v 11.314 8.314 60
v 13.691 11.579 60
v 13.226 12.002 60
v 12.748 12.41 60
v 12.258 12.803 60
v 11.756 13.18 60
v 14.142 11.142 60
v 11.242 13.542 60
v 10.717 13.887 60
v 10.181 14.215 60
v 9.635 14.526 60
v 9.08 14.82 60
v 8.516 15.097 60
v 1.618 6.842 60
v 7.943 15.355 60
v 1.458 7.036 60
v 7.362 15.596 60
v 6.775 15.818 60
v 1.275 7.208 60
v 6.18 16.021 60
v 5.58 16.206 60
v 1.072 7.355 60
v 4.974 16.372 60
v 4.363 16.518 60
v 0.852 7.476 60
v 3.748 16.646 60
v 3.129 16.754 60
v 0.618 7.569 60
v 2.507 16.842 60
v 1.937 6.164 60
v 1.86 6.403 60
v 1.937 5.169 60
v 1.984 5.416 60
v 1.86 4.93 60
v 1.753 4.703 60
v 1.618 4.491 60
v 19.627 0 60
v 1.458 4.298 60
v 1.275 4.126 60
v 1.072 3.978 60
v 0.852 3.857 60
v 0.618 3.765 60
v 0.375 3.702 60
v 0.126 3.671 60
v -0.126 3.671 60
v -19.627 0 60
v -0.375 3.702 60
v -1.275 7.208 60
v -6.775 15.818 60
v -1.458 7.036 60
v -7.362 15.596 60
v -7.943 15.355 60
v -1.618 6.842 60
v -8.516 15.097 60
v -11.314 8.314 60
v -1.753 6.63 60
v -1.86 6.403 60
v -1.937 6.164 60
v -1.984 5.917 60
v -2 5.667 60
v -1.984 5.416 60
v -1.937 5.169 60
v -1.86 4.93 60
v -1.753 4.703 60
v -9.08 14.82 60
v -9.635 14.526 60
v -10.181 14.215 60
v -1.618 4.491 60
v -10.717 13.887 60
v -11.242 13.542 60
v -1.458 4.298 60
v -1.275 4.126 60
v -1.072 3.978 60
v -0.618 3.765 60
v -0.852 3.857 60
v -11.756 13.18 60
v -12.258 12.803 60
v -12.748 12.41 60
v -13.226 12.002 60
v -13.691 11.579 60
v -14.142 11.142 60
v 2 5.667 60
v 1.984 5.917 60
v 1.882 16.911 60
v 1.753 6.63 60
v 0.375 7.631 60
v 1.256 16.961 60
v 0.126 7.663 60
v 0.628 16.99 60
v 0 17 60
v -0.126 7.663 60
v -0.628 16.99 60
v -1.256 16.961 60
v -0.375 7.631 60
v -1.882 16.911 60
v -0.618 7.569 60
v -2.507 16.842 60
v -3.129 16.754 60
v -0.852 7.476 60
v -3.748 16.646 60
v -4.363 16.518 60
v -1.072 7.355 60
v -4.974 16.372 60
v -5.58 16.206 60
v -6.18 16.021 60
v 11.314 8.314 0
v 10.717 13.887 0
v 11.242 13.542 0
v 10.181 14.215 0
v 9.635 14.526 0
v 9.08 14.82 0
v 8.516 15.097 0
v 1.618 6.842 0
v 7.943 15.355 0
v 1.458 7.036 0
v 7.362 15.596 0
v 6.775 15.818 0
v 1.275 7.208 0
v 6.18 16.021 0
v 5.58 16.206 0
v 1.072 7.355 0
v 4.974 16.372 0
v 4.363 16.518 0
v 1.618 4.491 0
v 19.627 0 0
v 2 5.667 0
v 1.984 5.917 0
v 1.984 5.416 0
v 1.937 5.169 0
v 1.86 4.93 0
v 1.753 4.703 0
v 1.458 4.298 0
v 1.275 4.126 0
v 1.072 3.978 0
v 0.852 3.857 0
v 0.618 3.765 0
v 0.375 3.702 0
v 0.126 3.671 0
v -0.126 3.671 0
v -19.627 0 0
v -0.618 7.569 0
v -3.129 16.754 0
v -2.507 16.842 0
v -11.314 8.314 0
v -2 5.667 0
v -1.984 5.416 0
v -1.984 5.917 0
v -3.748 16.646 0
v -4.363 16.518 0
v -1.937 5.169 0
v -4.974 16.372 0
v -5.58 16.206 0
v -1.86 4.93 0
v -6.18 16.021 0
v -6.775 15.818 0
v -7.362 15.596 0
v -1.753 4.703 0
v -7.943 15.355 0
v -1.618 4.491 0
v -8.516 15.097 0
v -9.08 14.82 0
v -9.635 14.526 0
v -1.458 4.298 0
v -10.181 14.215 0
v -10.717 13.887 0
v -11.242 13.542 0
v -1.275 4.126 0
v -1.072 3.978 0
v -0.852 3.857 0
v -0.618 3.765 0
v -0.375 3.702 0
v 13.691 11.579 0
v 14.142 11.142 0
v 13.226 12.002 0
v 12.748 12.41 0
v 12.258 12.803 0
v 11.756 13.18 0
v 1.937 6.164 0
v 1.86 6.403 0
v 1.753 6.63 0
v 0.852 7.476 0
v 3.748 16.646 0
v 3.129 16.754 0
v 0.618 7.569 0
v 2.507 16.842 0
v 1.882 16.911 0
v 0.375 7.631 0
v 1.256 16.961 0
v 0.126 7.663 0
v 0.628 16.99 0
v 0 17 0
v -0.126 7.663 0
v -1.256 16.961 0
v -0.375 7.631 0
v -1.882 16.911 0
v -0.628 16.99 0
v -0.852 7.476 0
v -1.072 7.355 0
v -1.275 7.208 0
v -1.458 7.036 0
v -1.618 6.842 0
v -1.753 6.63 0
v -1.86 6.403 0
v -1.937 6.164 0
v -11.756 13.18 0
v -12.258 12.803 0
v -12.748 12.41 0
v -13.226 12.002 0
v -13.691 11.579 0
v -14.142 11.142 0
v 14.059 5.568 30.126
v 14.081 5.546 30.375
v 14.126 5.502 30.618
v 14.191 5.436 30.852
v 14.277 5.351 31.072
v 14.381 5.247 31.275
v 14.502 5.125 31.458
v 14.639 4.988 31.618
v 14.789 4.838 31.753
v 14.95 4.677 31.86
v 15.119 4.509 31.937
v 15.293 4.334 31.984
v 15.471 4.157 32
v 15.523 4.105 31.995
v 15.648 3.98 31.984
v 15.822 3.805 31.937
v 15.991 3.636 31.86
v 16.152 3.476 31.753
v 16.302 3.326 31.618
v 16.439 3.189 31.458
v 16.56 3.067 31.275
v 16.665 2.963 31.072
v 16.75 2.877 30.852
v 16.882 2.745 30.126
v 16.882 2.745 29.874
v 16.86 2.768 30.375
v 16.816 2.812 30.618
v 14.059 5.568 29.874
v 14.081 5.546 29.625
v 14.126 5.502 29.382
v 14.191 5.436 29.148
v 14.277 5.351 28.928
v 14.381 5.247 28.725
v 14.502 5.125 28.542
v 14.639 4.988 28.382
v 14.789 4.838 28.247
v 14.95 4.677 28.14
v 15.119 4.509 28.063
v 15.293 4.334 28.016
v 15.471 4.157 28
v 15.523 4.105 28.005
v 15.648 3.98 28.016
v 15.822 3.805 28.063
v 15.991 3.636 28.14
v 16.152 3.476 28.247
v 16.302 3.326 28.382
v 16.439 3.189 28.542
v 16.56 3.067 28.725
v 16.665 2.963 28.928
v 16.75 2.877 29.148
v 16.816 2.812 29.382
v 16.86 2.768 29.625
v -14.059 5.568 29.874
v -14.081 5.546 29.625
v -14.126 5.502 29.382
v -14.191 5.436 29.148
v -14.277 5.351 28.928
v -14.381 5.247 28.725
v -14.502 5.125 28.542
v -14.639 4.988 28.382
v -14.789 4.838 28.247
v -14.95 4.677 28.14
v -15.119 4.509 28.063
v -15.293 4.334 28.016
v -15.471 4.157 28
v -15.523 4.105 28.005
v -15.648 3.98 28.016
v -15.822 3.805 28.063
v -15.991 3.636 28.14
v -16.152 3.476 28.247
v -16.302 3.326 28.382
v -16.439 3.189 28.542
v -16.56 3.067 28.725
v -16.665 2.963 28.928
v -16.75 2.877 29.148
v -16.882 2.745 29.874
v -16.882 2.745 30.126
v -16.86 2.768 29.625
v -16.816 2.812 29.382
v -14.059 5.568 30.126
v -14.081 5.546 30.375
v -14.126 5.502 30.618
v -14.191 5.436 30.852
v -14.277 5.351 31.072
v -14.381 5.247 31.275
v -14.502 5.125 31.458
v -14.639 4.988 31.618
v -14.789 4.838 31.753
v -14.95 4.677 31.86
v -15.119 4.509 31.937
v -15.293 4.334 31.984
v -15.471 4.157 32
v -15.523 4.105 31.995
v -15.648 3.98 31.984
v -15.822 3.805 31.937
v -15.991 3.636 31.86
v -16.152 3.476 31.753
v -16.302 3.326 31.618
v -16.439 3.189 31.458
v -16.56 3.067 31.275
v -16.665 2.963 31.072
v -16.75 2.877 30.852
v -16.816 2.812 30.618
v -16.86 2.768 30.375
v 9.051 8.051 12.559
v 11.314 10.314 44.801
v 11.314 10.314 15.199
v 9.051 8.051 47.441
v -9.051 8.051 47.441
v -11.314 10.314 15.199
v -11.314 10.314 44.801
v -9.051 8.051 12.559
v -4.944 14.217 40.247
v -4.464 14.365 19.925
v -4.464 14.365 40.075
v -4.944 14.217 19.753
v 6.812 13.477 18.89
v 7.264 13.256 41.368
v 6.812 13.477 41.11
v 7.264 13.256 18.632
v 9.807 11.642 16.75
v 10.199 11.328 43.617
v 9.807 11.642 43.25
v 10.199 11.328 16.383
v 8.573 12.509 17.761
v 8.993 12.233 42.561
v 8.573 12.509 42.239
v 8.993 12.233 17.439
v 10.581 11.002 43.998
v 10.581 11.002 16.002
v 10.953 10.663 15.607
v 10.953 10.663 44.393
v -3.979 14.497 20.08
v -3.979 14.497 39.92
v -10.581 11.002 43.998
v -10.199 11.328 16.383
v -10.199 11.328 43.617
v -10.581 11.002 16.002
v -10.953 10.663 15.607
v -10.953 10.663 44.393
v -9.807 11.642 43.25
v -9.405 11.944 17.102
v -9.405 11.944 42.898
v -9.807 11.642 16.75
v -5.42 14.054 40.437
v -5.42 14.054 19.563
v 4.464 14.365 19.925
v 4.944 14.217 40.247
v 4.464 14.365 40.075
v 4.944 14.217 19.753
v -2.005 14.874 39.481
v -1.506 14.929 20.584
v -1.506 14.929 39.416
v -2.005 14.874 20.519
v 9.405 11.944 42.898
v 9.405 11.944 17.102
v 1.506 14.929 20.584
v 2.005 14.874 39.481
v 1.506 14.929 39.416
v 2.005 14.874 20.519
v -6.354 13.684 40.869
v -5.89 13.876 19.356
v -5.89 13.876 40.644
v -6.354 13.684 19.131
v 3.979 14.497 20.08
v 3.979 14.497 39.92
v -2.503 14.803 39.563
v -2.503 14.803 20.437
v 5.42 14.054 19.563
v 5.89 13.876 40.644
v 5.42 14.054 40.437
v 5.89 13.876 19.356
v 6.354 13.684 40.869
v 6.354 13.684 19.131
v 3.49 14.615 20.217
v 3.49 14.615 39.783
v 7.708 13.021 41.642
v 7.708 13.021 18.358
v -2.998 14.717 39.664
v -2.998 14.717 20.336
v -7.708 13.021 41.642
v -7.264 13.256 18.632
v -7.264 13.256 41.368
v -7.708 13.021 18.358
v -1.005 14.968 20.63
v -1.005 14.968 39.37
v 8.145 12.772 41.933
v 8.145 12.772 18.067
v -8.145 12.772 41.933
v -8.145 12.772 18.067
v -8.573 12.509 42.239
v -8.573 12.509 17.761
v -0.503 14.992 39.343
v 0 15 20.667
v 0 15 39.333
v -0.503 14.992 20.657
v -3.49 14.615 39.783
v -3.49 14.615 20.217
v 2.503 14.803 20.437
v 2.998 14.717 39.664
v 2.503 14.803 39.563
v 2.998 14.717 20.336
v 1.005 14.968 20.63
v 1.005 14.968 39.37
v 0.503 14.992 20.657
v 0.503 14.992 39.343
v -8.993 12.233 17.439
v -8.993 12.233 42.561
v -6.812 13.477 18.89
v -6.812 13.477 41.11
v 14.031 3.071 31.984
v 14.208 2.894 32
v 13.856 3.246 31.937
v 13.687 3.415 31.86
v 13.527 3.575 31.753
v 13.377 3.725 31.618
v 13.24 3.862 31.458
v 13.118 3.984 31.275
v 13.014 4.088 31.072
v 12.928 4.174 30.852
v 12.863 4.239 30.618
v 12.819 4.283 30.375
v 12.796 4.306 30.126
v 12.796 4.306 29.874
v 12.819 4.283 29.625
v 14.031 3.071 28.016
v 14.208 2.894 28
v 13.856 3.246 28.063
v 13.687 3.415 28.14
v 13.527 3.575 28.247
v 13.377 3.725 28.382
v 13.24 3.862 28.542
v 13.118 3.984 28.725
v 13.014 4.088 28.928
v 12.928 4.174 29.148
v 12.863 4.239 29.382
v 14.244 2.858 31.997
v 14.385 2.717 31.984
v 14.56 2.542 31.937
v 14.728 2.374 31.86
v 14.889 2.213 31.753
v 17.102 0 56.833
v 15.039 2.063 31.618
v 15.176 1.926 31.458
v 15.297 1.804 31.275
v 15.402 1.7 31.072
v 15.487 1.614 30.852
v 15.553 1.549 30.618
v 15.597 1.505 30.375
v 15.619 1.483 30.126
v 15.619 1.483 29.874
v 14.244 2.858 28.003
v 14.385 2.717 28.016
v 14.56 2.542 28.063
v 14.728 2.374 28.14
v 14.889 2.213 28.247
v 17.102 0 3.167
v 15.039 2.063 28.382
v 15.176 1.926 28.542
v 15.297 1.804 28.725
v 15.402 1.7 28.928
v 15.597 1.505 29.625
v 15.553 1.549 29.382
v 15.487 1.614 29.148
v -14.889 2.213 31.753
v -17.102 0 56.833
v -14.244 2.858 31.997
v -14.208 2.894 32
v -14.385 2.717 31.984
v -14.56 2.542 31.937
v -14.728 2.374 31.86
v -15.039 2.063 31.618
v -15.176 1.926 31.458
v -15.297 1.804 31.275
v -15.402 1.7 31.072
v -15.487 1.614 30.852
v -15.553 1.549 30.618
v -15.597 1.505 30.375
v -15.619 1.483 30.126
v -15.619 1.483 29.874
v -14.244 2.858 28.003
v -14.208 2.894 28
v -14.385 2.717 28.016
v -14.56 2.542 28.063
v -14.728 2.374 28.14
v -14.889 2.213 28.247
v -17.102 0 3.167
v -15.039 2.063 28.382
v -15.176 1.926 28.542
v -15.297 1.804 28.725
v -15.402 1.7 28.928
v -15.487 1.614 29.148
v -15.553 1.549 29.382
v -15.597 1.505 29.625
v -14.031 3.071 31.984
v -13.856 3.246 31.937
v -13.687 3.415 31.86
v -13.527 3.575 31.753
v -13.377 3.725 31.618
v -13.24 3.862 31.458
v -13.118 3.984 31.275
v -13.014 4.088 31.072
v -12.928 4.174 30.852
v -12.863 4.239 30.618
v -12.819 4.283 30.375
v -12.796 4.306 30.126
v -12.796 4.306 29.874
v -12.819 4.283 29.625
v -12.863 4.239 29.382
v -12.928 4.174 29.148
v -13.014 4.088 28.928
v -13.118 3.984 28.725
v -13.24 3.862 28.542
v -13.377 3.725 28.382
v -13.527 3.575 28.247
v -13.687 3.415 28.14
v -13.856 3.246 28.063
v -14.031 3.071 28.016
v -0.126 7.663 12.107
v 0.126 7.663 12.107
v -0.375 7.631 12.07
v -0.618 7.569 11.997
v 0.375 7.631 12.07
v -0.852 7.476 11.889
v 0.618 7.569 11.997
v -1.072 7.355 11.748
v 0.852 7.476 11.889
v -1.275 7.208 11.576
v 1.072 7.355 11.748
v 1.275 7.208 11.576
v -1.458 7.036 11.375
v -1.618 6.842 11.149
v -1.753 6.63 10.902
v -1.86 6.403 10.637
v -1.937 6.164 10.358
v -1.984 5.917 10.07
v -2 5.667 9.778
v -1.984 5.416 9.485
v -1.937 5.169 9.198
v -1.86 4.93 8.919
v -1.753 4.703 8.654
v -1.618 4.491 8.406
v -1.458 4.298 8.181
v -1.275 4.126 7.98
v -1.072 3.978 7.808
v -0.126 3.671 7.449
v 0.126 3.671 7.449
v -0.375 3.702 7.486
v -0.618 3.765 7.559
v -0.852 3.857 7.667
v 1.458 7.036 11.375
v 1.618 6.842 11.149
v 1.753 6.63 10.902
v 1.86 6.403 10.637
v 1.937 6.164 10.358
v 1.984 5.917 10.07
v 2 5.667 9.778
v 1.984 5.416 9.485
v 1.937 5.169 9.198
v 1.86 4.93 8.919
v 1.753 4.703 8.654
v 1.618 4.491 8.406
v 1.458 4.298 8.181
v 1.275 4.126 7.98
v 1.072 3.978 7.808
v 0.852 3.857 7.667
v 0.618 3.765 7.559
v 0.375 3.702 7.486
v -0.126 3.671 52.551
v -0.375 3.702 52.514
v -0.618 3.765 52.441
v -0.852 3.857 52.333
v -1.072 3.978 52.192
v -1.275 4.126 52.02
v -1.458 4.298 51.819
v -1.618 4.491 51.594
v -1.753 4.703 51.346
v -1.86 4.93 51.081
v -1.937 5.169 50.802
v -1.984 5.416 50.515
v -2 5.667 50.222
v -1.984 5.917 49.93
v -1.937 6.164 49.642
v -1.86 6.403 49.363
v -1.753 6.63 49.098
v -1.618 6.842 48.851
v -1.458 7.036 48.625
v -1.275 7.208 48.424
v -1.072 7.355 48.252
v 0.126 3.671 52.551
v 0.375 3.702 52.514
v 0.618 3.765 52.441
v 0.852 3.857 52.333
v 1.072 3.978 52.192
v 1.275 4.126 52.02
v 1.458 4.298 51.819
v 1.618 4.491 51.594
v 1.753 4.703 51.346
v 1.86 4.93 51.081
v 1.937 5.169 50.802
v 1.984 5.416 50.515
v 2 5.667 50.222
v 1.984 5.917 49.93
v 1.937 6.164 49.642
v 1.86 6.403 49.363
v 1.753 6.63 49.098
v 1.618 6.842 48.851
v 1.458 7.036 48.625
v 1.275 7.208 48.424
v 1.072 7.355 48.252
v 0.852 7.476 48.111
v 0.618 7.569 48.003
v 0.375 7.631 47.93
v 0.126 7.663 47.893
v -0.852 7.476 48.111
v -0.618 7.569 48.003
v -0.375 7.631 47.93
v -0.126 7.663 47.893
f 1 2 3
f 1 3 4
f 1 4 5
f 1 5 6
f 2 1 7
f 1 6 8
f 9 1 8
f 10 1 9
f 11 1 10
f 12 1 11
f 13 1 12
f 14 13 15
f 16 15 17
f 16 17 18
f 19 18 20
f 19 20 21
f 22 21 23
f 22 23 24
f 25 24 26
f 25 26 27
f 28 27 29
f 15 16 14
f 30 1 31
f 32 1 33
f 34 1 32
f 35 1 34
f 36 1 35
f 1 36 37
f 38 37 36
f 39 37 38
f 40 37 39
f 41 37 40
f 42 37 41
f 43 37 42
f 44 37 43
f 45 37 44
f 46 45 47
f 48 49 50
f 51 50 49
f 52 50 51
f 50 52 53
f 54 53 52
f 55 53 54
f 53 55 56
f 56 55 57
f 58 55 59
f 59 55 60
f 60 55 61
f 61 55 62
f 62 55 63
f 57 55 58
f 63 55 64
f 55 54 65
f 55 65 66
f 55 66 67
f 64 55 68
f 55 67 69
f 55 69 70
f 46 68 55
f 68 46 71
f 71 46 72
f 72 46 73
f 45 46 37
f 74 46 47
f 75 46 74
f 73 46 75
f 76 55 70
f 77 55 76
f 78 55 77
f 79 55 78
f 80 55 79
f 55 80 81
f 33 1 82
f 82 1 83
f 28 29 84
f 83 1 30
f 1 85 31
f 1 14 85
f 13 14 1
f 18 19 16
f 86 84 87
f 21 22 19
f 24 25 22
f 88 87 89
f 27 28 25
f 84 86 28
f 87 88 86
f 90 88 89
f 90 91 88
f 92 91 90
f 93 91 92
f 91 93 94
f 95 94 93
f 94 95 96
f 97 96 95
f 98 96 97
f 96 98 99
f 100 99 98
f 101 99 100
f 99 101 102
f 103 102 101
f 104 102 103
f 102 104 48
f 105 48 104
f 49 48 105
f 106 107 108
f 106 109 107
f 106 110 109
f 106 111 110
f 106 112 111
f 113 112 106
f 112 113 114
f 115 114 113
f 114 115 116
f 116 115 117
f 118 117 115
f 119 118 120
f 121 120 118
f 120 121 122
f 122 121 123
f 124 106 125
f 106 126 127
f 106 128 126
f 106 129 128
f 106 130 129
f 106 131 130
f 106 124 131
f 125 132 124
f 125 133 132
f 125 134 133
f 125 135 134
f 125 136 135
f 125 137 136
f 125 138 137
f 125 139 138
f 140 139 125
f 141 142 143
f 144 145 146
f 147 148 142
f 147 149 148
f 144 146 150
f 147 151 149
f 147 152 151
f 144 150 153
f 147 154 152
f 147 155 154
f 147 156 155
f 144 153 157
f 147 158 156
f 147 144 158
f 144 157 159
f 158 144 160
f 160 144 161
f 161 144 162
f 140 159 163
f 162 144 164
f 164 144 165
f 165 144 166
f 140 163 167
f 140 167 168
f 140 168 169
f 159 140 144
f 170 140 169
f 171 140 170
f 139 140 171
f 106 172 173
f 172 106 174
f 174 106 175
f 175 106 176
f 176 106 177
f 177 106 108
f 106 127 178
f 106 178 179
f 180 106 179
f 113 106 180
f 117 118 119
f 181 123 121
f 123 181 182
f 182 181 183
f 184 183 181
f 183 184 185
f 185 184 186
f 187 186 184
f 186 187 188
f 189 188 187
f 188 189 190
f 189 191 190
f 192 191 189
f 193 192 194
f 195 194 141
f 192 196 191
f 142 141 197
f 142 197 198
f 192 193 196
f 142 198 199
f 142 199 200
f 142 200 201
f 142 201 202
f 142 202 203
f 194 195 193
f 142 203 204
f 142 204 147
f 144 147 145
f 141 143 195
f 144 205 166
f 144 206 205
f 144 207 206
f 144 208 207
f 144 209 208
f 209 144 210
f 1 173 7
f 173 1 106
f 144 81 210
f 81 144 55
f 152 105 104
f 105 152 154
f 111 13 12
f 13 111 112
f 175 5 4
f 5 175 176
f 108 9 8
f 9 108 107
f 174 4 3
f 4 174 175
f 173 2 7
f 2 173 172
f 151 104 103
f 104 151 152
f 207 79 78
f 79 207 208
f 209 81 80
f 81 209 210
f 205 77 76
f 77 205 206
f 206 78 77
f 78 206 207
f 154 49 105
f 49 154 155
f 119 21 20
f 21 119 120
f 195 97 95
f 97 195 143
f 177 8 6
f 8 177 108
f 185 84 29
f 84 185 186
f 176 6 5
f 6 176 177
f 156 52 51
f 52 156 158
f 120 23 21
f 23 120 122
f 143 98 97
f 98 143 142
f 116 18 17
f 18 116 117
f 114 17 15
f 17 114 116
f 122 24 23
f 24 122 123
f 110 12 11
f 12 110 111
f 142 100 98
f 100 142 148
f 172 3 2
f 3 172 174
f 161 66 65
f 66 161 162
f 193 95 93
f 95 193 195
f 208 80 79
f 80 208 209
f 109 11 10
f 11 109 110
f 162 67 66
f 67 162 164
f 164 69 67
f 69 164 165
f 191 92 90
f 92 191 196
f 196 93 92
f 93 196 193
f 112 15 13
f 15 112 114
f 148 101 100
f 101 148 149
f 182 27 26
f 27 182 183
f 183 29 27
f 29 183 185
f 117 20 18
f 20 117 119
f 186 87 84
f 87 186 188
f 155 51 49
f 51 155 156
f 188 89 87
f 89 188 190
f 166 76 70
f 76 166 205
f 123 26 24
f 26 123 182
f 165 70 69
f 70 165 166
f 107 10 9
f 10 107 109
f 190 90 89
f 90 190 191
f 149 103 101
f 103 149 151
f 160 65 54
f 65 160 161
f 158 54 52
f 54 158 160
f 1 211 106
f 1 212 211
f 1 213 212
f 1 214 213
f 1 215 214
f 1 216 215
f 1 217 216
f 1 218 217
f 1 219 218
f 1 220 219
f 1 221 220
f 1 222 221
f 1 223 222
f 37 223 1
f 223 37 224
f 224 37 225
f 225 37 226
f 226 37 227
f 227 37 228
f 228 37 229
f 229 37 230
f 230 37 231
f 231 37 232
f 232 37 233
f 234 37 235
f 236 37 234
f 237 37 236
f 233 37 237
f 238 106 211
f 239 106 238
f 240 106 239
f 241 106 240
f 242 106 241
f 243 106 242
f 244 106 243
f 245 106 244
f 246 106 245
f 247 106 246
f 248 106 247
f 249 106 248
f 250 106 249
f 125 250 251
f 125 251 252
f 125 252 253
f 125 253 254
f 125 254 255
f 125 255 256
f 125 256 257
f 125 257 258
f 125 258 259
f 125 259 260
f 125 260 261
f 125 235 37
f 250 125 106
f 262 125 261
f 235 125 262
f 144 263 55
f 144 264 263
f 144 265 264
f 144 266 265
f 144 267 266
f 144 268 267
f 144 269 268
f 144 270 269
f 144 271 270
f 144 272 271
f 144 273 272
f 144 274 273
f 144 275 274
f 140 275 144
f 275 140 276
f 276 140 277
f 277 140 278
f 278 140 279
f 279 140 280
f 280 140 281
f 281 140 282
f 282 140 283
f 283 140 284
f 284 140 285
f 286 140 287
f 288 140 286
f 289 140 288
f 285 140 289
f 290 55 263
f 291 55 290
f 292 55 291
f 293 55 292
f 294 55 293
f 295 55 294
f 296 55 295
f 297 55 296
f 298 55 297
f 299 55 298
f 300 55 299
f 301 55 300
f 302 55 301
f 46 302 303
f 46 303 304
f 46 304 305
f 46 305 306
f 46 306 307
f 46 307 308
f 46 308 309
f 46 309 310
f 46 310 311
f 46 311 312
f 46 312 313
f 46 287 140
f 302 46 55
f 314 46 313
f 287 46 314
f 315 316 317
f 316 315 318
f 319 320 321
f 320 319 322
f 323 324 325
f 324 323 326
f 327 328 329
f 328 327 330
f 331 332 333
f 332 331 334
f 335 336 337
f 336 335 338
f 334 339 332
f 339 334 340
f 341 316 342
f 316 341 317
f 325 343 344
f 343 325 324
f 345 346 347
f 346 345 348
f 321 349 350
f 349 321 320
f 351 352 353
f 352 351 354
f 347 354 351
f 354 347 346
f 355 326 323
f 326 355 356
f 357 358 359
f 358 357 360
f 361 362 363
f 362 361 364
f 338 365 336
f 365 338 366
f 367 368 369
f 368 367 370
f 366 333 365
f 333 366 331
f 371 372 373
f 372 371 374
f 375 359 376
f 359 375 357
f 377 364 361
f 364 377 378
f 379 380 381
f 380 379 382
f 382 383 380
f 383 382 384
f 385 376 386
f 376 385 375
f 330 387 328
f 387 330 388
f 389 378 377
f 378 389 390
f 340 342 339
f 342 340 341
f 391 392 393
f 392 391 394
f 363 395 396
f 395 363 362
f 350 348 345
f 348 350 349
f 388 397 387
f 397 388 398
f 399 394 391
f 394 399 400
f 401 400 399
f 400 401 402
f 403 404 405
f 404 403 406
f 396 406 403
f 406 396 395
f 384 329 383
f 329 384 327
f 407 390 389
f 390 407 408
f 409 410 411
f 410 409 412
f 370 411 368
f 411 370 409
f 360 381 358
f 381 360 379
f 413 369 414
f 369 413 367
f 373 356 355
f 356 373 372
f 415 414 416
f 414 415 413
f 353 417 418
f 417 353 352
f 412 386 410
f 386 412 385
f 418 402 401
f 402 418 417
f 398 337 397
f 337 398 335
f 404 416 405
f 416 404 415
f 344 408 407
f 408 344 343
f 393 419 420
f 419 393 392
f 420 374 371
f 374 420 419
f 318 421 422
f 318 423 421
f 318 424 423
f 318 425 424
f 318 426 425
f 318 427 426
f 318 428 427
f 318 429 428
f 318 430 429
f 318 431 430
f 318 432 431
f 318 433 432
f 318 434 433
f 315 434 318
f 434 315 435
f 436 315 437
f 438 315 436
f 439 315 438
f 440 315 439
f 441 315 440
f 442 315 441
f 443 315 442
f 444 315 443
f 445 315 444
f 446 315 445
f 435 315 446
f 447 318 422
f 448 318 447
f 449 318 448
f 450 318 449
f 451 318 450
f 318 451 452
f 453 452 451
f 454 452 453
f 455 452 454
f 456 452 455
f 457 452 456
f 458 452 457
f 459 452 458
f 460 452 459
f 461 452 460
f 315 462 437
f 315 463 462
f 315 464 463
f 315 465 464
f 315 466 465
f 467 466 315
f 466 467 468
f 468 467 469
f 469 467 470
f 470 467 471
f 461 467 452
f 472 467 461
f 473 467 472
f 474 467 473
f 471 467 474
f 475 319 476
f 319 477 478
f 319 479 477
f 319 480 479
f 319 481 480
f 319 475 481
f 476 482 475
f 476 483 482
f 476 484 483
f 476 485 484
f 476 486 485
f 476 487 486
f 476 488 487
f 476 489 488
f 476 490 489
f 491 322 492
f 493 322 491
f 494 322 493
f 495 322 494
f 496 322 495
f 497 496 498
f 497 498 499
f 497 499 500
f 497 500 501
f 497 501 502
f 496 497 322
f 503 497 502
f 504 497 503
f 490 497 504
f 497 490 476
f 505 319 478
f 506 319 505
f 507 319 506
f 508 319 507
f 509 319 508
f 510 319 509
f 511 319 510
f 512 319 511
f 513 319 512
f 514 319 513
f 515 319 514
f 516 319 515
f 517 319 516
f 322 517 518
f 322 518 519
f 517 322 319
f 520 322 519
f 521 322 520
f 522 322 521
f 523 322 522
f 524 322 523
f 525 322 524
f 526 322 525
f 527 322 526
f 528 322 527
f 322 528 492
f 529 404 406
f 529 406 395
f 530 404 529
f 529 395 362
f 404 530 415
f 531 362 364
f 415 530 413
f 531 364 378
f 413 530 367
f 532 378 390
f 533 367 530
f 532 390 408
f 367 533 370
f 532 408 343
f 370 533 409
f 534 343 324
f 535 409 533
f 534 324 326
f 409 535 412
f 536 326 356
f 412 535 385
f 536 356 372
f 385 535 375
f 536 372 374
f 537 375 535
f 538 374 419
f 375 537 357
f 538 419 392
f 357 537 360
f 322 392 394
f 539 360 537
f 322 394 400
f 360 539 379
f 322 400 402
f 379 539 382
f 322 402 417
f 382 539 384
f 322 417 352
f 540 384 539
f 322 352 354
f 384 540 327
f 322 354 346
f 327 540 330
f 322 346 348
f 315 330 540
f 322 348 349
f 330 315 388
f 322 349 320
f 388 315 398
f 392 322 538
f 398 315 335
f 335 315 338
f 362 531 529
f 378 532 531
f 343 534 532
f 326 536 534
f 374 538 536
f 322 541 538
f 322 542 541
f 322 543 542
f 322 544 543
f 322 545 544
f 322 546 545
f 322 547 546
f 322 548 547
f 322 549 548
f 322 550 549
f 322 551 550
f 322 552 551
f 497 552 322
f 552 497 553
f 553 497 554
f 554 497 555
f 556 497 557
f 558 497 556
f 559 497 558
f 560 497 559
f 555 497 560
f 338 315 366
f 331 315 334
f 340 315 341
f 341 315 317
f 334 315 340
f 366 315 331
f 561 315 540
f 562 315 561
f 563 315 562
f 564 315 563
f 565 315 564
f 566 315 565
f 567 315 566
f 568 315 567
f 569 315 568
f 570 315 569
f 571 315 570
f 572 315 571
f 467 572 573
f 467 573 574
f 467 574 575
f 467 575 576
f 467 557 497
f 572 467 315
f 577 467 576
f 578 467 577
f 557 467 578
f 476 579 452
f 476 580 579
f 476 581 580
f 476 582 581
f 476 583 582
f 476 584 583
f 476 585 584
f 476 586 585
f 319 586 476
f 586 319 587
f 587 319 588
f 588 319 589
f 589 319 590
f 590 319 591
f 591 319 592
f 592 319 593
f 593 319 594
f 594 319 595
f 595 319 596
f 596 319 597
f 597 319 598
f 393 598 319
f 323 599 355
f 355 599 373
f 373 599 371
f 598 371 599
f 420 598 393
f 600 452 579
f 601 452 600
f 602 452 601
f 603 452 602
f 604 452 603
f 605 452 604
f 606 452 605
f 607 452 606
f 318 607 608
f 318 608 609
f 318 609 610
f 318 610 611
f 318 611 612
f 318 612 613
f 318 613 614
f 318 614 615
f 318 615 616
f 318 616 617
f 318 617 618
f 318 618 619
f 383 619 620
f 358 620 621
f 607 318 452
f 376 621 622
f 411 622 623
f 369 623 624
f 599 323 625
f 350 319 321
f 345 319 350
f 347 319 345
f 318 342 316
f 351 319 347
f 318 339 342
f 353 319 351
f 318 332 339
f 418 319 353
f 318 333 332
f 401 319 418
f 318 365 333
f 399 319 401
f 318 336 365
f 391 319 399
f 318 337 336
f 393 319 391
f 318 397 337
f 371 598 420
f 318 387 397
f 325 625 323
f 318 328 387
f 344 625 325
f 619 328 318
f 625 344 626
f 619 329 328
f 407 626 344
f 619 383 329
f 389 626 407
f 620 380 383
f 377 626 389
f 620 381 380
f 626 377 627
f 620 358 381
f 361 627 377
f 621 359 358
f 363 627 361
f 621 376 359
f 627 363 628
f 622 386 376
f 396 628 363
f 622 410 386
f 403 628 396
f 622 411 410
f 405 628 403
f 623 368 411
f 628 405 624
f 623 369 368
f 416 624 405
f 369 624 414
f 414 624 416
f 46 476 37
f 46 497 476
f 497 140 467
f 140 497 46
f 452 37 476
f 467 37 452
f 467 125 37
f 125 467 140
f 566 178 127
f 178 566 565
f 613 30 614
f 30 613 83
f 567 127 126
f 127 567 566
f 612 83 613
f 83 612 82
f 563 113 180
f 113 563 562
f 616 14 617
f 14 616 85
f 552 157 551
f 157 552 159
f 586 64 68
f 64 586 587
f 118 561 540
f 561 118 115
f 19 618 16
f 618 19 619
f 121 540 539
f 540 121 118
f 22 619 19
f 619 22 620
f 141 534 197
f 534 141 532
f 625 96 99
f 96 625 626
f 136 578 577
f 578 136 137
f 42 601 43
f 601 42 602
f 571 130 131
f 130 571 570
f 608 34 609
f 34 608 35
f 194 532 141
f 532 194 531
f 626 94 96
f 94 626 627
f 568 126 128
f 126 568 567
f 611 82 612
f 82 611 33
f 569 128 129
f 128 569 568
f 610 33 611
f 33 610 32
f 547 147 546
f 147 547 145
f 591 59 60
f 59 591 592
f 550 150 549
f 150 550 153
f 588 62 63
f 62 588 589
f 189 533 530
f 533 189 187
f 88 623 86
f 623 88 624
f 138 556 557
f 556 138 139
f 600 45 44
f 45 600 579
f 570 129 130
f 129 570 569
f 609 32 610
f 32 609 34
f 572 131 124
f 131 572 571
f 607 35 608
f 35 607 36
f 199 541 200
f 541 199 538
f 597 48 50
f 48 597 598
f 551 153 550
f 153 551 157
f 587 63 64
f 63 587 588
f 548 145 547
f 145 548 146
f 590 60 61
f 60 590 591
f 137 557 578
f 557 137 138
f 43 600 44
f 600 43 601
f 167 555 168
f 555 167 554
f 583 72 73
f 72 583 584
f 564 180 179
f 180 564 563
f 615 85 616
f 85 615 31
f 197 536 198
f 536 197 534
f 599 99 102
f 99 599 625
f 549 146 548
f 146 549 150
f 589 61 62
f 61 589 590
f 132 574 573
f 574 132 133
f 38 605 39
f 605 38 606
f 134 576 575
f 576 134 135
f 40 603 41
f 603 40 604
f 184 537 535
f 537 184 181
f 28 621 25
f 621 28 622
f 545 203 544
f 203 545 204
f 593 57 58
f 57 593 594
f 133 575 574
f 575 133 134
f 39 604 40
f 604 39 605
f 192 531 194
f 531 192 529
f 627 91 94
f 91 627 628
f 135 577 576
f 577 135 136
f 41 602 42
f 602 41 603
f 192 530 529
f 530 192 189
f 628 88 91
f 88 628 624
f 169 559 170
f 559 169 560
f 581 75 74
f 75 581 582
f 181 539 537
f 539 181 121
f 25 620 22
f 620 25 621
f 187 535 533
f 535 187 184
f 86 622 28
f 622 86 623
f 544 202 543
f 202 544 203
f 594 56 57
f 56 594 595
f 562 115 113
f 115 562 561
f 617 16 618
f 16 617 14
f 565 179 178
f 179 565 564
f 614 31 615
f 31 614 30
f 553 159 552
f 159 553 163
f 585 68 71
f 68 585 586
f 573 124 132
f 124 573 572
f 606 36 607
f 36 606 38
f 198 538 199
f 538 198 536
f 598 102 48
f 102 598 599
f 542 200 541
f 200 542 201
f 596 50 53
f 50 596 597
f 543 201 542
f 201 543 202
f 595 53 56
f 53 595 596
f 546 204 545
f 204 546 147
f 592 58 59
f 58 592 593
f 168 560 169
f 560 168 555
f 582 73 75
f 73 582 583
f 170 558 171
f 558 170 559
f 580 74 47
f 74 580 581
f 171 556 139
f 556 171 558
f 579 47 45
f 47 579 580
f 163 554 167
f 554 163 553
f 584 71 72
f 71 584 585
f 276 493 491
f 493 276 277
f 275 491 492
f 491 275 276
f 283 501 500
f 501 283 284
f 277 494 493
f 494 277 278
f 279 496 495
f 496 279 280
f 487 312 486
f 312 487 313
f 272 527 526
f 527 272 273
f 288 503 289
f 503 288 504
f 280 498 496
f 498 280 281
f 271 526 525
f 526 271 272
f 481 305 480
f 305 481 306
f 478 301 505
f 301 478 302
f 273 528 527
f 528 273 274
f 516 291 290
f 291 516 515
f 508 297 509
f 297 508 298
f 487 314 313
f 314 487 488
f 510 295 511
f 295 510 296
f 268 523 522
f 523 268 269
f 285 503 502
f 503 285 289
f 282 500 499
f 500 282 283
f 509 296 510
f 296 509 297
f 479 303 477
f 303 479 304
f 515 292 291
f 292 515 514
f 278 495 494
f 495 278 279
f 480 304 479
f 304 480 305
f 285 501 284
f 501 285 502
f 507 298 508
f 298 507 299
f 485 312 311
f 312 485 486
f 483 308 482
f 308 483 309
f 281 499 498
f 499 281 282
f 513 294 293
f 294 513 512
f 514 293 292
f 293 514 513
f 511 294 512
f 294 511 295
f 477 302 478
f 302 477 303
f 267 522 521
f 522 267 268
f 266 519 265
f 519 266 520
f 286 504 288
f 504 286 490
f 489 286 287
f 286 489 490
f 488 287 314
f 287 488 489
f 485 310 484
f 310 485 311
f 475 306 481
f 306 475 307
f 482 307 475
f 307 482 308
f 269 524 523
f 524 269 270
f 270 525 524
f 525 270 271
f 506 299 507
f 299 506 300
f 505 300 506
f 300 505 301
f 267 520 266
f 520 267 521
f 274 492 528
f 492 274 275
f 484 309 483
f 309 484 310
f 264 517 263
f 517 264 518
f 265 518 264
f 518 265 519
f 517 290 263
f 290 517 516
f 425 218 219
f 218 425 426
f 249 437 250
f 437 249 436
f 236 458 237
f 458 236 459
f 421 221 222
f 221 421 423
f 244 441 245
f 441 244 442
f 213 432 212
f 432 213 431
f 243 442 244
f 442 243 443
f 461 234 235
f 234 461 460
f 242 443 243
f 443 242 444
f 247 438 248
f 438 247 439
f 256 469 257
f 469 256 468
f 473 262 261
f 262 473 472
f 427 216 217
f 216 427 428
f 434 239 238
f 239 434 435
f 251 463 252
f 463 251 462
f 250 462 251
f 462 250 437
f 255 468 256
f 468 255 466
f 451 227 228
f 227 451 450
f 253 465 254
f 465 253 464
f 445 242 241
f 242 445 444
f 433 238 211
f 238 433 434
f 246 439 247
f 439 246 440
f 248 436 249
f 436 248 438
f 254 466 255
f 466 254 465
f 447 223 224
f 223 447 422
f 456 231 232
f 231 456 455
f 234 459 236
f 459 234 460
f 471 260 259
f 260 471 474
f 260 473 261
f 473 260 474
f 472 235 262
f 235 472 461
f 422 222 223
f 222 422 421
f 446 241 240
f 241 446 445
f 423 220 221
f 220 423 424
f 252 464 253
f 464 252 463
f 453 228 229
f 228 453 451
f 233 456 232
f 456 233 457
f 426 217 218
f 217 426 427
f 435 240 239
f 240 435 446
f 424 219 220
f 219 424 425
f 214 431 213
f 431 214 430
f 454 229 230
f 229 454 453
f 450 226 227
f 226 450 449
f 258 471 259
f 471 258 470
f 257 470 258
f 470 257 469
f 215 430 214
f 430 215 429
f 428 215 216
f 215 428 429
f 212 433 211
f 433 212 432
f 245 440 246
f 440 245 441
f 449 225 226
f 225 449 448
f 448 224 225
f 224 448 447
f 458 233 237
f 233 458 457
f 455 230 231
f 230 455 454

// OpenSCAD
height = 60;
radius = 20;
thick = 4;
screw_d = 4;

module roof(radius, height) {
	rotate(-45)
	    intersection() {
	        cube([radius, radius, height]);
	        rotate(45) 
				cube([radius * 2, radius * 2, height]);
	    }
}

module round_edge(radius, height) {
	difference() {
        union() {
            roof(radius, height);
            mirror([1,0,0]) 
                roof(radius, height);
            cylinder(h = height, r = radius, $fn=200);
        }
        translate([0, -radius / 2, height / 2])
            cube([3 * radius, radius, height + 1], center=true);
   }
}

module cut_plane(radius, height, direction) {
	mirror_x = max(direction, 0);
	translate([direction * 2 * radius * sin(45), 0, -1])
		rotate(direction * 45)
       		mirror([mirror_x, 0, 0])
				translate([-1, 0, 0]) 
					cube([thick + 1, radius,  height + 2]);
}

module omega(radius, height) {
	difference() {
		round_edge(radius, height);
		cut_plane(radius, height, 1);
		cut_plane(radius, height, -1);
	}
}

module empty_omega(radius, height) {
	translate([0,  -thick / 2 - 1, 0]) 
		difference() {
			omega(radius, height);
			// inner omega
			translate([0, thick / 2, thick / 2]) 
				scale([(radius - thick) / radius, 
	                  (radius - thick) / radius, 
	                  (height - thick) / height])					
					intersection() {
						omega(radius, height);
						translate([height,  0, 0]) 
							rotate([0, 270, 0]) roof (height * cos(45), 2 * height);
					}
			// cut bottom
			translate([-1.5 * radius, -radius + thick / 2 + 1, -1]) 
				cube([3 * radius, radius, height + 2]);
		}
	}

module edge(radius, height) {
	difference() {
		empty_omega(radius, height);

		// holes z
	    translate([0,  (radius - thick / 2 - 1) / 3, -1])
			cylinder(h = height + 2, r = screw_d / 2, $fn = 50);
		// hole x1
		translate([-(radius - thick / 2 - 2) * sin(45),  0, height / 2])
			rotate([0, 90, 135])
				cylinder(h = radius, r = screw_d / 2, $fn = 50);
		// hole x2
		translate([(radius - thick / 2 - 2) * sin(45),  0, height / 2])
			rotate([0, 90, 45])
				cylinder(h = radius, r = screw_d / 2, $fn = 50);
	}
}

edge(radius, height);

//intersection() {
//	omega(radius, height);
//	translate([height,  0, 0]) 
//		rotate([0, 270, 0]) roof (height * cos(45), 2 * height);
//}

//%omega(radius, height);
//%scale([(radius - thick) / radius, 
//	(radius - thick) / radius, 
//	(height - thick) / height])
//		omega(radius, height);
//
//#translate([height / 2,  0, 0])
//rotate([0, 270, 0])
//    roof(radius, height);
